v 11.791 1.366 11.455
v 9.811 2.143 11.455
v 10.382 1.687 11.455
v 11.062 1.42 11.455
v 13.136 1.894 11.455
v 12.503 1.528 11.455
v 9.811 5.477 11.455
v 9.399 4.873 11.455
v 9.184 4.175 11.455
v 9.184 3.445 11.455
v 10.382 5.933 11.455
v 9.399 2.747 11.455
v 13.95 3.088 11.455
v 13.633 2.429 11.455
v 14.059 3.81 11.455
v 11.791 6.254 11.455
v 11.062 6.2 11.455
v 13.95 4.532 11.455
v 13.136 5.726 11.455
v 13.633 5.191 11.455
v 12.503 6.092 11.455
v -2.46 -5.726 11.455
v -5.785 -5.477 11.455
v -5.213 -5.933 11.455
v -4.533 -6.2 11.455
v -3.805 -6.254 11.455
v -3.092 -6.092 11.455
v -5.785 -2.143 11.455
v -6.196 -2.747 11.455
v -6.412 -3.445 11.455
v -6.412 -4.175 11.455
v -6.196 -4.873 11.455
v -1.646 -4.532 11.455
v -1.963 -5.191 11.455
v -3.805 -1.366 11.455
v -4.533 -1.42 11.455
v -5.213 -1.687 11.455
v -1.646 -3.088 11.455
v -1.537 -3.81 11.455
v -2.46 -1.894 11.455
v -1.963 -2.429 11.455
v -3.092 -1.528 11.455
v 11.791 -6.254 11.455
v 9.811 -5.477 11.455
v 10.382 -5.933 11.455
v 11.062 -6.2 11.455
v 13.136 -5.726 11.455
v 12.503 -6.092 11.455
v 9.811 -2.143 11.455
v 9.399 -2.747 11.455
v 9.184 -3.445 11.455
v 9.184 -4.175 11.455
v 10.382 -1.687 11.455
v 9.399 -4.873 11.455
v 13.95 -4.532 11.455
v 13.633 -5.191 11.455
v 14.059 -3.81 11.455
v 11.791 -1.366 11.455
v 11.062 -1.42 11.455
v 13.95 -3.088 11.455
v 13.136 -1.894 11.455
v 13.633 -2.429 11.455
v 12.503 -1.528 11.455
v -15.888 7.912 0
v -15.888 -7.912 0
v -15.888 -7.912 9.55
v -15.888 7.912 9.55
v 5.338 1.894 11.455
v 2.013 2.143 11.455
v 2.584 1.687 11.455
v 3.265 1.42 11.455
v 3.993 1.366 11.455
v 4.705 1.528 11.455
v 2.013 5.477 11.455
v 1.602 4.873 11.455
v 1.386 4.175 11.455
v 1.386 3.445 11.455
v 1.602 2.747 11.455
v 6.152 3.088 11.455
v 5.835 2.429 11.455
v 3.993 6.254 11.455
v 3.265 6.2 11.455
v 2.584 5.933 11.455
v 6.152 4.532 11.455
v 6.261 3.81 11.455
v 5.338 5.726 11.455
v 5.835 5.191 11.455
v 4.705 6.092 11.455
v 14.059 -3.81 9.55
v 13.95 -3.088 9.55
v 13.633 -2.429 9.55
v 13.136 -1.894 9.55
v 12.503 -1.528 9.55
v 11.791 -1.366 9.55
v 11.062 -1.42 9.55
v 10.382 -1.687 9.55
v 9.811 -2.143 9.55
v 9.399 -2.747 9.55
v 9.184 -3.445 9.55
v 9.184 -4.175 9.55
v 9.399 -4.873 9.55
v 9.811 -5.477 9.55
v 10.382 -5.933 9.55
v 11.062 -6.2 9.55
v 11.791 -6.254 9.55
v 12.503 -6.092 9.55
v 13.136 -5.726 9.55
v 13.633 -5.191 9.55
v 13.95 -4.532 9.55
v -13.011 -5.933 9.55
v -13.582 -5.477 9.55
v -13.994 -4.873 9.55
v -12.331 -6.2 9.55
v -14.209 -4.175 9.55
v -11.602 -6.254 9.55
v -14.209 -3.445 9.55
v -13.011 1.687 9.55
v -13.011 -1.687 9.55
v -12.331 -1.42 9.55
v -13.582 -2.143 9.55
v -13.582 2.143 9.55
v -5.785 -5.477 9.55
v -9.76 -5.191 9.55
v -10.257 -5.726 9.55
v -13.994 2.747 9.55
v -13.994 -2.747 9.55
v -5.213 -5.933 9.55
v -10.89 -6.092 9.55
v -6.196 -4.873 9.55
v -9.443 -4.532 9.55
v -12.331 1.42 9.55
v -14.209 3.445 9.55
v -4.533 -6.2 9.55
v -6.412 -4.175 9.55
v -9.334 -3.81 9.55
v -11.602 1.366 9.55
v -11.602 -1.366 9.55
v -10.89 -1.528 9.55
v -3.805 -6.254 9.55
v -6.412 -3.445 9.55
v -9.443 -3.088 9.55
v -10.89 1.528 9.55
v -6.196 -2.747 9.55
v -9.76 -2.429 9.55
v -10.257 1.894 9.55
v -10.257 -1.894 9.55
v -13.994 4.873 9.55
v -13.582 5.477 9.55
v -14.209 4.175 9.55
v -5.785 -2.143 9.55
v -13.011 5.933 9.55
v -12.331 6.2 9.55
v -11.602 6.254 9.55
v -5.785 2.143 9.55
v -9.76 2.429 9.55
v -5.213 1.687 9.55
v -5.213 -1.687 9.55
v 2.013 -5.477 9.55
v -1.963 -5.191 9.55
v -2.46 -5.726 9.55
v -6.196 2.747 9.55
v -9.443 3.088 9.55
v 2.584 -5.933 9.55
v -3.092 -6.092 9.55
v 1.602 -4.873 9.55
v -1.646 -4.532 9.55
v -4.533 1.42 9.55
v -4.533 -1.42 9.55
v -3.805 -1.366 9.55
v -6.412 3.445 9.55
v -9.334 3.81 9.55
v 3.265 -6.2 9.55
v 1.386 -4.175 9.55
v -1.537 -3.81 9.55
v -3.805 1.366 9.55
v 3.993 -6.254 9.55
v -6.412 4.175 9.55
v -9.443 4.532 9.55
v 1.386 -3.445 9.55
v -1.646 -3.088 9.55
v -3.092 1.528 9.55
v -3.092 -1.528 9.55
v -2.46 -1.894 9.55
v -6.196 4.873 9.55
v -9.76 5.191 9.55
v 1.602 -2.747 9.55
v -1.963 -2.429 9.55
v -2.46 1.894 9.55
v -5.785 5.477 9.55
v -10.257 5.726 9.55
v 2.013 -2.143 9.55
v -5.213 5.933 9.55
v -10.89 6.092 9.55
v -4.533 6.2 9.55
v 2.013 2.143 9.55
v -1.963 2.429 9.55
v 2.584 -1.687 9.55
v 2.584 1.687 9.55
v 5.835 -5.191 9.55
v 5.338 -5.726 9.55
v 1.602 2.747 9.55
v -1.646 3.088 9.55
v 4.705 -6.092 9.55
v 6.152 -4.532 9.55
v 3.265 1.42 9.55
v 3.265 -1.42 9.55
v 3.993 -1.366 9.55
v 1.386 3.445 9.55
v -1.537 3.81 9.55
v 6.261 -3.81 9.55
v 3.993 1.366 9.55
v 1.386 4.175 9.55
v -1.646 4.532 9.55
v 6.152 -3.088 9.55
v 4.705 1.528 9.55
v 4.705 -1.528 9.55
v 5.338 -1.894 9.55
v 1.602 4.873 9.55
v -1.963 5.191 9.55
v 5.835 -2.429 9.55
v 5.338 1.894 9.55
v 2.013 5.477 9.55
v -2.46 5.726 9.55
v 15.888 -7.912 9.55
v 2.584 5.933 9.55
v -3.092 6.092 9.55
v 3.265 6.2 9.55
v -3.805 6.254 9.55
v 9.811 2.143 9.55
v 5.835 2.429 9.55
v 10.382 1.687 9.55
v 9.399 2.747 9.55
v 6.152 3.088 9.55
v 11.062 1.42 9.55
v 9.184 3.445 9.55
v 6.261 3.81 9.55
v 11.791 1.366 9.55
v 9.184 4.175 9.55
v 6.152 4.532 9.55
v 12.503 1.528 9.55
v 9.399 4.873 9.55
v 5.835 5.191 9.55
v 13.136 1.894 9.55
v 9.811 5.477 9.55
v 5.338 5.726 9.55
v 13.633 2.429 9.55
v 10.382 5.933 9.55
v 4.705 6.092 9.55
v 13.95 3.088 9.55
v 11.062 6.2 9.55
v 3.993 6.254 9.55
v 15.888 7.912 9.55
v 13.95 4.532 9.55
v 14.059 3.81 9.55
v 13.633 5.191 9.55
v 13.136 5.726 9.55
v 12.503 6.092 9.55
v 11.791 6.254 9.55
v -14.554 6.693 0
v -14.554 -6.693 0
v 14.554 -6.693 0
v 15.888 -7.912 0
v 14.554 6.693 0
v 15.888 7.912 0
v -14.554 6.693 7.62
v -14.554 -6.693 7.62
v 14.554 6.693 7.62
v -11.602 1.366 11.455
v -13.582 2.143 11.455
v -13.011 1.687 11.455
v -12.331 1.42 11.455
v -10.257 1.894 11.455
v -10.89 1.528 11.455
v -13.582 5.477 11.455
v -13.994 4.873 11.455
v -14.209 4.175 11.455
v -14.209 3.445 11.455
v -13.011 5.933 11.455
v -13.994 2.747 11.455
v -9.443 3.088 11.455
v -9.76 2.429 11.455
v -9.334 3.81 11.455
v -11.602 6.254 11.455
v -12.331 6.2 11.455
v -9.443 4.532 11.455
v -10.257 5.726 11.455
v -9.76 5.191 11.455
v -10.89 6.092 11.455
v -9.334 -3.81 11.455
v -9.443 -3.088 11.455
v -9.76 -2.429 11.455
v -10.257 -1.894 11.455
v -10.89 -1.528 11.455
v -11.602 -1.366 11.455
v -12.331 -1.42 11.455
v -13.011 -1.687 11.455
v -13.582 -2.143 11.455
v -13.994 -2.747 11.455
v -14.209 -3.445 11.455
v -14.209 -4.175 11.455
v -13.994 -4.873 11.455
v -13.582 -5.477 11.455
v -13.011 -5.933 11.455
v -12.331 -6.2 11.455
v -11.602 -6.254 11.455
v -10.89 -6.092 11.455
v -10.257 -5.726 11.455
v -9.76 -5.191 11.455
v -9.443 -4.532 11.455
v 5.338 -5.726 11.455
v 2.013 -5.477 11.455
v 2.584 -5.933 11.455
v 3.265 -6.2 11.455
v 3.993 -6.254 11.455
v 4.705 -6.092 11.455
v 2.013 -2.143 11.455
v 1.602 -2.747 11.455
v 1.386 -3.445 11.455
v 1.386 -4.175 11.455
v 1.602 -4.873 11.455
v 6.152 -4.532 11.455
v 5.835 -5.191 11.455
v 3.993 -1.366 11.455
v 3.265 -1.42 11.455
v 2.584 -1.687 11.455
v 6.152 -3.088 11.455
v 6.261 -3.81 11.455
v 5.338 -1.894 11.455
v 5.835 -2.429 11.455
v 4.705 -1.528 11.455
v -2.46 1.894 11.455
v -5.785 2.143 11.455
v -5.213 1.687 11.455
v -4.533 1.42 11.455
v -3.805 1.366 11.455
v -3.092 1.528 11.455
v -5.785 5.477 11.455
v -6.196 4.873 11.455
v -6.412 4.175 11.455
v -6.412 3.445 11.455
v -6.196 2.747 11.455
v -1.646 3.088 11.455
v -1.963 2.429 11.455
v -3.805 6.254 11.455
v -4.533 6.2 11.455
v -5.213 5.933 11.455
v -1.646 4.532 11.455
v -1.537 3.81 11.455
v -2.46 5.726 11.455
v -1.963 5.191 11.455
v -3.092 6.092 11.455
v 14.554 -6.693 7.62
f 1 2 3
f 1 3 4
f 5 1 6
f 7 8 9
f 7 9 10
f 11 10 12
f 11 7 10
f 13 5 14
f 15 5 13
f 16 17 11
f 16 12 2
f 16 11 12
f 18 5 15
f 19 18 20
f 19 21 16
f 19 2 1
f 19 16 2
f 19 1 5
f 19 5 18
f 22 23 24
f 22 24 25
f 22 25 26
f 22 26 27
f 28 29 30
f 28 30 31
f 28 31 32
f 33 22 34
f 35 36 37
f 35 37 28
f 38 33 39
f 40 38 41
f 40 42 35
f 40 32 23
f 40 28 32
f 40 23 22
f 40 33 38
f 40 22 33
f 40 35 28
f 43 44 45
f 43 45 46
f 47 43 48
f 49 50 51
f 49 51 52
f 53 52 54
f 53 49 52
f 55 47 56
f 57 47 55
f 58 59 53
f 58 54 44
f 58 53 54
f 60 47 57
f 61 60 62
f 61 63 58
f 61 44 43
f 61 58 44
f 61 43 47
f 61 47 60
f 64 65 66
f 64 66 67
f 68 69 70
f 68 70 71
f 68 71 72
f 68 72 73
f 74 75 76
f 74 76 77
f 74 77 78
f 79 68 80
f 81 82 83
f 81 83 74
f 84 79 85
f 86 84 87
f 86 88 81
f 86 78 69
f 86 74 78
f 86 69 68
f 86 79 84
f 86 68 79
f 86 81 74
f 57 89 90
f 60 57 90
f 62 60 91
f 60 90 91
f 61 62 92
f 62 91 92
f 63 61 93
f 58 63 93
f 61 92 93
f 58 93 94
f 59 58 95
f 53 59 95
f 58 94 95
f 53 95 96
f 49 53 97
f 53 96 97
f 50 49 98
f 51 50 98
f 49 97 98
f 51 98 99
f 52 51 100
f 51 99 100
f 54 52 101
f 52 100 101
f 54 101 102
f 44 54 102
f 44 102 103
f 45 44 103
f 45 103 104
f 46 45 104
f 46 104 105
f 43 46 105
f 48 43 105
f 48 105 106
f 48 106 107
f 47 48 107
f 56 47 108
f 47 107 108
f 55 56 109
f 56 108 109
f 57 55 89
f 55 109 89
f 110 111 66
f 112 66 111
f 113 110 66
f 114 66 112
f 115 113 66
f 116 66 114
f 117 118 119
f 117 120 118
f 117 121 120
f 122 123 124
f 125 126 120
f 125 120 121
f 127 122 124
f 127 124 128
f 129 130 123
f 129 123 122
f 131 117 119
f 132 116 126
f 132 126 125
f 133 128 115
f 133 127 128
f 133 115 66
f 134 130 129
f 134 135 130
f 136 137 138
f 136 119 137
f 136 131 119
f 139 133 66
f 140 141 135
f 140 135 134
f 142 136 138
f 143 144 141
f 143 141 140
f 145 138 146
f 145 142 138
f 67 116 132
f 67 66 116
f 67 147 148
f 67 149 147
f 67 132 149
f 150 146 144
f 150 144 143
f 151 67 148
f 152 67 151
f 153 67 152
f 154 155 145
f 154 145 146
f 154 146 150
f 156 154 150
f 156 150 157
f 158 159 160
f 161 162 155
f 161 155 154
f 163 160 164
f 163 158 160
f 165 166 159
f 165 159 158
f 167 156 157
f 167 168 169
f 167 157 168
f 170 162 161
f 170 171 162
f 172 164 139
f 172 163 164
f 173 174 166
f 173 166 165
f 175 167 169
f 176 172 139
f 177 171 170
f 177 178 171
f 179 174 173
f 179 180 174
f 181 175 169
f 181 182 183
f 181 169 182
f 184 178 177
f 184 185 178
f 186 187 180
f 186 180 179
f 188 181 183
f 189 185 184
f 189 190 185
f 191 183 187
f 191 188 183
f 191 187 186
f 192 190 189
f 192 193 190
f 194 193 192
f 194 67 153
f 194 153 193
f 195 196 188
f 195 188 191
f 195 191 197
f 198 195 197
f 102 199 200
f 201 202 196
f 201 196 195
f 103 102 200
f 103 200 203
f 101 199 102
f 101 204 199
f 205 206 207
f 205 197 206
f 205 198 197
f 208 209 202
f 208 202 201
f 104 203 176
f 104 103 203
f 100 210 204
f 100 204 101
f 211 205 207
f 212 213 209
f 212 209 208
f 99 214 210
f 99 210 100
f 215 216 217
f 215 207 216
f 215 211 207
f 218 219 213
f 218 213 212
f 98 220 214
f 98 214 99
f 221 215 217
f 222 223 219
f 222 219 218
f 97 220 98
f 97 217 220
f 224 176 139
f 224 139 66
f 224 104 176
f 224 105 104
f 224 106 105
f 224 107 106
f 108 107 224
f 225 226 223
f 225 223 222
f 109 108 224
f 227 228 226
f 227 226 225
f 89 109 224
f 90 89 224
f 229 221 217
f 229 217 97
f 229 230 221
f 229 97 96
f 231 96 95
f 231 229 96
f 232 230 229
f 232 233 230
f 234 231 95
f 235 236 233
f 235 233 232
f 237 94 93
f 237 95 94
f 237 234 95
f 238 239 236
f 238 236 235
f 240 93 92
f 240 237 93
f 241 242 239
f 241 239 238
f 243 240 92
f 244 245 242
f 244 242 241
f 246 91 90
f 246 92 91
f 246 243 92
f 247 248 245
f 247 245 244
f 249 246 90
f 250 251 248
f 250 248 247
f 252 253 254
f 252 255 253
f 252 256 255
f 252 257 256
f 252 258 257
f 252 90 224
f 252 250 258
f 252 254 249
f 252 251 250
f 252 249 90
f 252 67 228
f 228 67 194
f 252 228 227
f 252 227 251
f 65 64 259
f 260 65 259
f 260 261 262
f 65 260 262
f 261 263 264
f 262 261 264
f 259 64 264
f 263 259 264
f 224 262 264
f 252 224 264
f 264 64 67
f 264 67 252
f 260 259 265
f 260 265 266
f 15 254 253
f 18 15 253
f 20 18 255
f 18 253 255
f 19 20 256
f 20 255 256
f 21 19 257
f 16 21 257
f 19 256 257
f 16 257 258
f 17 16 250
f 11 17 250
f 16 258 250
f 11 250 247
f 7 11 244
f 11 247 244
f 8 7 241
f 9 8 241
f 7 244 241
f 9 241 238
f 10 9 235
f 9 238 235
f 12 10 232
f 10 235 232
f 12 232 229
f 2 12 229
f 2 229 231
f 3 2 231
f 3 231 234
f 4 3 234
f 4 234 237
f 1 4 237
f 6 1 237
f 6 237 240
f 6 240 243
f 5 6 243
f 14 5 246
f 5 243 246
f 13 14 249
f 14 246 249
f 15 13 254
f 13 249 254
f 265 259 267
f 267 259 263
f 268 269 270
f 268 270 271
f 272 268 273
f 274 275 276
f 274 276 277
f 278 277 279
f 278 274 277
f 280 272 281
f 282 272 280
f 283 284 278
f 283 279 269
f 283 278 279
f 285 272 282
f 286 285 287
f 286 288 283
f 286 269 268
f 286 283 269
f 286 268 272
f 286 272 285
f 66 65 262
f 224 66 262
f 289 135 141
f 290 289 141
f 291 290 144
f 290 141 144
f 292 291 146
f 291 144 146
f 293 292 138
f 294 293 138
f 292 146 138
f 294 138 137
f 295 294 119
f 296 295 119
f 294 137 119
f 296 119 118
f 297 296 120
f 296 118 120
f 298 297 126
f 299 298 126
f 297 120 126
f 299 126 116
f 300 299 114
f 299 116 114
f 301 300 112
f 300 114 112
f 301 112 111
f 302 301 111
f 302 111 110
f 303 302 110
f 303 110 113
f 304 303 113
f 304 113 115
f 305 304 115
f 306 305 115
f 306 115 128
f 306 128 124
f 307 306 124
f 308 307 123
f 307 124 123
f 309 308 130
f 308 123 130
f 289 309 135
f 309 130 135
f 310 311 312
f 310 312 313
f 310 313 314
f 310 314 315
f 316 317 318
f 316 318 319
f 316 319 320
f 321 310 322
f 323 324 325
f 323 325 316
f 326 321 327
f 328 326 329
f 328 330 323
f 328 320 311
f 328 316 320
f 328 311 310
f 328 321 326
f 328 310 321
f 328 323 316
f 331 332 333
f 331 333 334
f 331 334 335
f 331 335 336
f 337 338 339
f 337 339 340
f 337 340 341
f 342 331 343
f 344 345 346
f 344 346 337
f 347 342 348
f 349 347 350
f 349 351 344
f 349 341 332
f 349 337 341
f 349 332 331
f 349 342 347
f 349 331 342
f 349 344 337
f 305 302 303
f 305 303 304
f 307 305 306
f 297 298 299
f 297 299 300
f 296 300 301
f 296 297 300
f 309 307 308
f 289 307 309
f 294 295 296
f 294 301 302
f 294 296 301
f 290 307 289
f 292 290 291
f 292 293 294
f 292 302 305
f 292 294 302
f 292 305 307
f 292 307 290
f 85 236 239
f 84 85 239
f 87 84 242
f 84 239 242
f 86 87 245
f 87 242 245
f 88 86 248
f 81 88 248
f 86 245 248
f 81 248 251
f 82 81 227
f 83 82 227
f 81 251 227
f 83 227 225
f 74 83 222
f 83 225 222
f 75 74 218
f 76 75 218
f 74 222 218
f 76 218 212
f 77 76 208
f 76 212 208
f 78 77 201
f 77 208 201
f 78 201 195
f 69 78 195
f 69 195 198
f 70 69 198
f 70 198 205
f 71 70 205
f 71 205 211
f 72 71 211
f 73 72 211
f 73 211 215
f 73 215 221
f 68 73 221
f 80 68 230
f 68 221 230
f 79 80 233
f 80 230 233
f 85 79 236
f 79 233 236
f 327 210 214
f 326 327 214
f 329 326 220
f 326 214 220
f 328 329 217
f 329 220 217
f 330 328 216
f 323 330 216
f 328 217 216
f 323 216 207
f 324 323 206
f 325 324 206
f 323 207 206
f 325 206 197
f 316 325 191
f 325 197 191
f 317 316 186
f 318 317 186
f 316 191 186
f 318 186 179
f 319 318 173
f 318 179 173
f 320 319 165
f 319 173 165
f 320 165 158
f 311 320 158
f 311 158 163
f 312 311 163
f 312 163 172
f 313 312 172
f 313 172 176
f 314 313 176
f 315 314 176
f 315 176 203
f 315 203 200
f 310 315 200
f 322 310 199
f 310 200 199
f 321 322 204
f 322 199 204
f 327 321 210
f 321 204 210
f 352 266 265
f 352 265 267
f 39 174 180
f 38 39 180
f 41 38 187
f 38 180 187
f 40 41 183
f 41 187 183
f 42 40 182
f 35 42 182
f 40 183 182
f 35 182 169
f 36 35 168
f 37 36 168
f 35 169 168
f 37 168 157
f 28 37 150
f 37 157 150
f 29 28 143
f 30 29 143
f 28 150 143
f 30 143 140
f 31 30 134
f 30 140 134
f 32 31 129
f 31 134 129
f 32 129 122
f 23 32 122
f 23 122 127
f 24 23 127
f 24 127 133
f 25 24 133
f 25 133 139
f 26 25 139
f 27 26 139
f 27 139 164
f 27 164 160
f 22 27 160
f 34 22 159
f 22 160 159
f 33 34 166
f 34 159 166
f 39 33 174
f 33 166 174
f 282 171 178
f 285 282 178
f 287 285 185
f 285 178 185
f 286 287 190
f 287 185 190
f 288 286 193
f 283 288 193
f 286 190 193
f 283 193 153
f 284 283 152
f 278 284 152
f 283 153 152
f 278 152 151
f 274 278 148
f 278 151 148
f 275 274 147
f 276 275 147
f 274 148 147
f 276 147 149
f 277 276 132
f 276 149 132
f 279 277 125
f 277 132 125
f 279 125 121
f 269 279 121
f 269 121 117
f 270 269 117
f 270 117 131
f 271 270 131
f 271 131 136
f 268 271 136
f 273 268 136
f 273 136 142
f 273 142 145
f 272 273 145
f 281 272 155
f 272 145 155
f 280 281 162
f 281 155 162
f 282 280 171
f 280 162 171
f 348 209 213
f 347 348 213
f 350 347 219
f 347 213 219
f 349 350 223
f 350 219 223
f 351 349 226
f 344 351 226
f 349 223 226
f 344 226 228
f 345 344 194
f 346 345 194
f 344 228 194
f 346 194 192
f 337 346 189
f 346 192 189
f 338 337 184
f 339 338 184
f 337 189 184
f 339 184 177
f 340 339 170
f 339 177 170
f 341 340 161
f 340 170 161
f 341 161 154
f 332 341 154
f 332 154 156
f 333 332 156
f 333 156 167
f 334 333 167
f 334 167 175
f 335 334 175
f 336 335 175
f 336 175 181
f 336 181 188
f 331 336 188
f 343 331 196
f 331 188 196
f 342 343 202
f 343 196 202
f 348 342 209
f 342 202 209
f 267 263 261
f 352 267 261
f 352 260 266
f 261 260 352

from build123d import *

# Parameters (mm, degrees)
F0_W      = 31.7754
F0_H      = 15.8242
F1_DEPTH  = 9.5504
F2_R      = 2.4511
F4_DEPTH  = 1.905
F3_R      = 2.4511
F5_DEPTH  = 1.905
F6_R      = 2.4511
F8_DEPTH  = 1.905
F7_R      = 2.4511
F9_DEPTH  = 1.905
F10_R     = 2.4511
F11_DEPTH = 1.905
F12_R     = 2.4511
F13_DEPTH = 1.905
F14_W     = 29.1084
F14_H     = 13.3858
F15_DEPTH = 7.62


with BuildPart() as f1:
    # F0 (on Top) → F1 (new body)
    with BuildSketch(Plane.XY):
        Rectangle(F0_W, F0_H)
    extrude(amount=F1_DEPTH)

    # F2 (on face) → F4 (join)
    with BuildSketch(Plane.XY.offset(9.5504)):
        with Locations((-11.7856, 3.81)):
            Circle(F2_R)
    extrude(amount=F4_DEPTH)

    # F3 (on face) → F5 (join)
    with BuildSketch(Plane.XY.offset(9.5504)):
        with Locations((-11.7856, -3.81)):
            Circle(F3_R)
    extrude(amount=F5_DEPTH)

    # F6 (on face) → F8 (join)
    with BuildSketch(Plane.XY.offset(9.5504)):
        with Locations((-3.9878, 3.81)):
            Circle(F6_R)
    extrude(amount=F8_DEPTH)

    # F7 (on face) → F9 (join)
    with BuildSketch(Plane.XY.offset(9.5504)):
        with Locations((-3.9878, -3.81)):
            Circle(F7_R)
    extrude(amount=F9_DEPTH)

    # F10 (on face) → F11 (join)
    with BuildSketch(Plane.XY.offset(9.5504)):
        with Locations((3.81, 3.81)):
            Circle(F10_R)
        with Locations((3.81, -3.81)):
            Circle(F10_R)
    extrude(amount=F11_DEPTH)

    # F12 (on face) → F13 (join)
    with BuildSketch(Plane.XY.offset(9.5504)):
        with Locations((11.6078, 3.81)):
            Circle(F12_R)
        with Locations((11.6078, -3.81)):
            Circle(F12_R)
    extrude(amount=F13_DEPTH)

    # F14 (on face) → F15 (cut)
    with BuildSketch(Plane(origin=(0, 0, 0), x_dir=(1, 0, 0), z_dir=(0, 0, -1))):
        Rectangle(F14_W, F14_H)
    extrude(amount=-F15_DEPTH, mode=Mode.SUBTRACT)


solid = f1.part
